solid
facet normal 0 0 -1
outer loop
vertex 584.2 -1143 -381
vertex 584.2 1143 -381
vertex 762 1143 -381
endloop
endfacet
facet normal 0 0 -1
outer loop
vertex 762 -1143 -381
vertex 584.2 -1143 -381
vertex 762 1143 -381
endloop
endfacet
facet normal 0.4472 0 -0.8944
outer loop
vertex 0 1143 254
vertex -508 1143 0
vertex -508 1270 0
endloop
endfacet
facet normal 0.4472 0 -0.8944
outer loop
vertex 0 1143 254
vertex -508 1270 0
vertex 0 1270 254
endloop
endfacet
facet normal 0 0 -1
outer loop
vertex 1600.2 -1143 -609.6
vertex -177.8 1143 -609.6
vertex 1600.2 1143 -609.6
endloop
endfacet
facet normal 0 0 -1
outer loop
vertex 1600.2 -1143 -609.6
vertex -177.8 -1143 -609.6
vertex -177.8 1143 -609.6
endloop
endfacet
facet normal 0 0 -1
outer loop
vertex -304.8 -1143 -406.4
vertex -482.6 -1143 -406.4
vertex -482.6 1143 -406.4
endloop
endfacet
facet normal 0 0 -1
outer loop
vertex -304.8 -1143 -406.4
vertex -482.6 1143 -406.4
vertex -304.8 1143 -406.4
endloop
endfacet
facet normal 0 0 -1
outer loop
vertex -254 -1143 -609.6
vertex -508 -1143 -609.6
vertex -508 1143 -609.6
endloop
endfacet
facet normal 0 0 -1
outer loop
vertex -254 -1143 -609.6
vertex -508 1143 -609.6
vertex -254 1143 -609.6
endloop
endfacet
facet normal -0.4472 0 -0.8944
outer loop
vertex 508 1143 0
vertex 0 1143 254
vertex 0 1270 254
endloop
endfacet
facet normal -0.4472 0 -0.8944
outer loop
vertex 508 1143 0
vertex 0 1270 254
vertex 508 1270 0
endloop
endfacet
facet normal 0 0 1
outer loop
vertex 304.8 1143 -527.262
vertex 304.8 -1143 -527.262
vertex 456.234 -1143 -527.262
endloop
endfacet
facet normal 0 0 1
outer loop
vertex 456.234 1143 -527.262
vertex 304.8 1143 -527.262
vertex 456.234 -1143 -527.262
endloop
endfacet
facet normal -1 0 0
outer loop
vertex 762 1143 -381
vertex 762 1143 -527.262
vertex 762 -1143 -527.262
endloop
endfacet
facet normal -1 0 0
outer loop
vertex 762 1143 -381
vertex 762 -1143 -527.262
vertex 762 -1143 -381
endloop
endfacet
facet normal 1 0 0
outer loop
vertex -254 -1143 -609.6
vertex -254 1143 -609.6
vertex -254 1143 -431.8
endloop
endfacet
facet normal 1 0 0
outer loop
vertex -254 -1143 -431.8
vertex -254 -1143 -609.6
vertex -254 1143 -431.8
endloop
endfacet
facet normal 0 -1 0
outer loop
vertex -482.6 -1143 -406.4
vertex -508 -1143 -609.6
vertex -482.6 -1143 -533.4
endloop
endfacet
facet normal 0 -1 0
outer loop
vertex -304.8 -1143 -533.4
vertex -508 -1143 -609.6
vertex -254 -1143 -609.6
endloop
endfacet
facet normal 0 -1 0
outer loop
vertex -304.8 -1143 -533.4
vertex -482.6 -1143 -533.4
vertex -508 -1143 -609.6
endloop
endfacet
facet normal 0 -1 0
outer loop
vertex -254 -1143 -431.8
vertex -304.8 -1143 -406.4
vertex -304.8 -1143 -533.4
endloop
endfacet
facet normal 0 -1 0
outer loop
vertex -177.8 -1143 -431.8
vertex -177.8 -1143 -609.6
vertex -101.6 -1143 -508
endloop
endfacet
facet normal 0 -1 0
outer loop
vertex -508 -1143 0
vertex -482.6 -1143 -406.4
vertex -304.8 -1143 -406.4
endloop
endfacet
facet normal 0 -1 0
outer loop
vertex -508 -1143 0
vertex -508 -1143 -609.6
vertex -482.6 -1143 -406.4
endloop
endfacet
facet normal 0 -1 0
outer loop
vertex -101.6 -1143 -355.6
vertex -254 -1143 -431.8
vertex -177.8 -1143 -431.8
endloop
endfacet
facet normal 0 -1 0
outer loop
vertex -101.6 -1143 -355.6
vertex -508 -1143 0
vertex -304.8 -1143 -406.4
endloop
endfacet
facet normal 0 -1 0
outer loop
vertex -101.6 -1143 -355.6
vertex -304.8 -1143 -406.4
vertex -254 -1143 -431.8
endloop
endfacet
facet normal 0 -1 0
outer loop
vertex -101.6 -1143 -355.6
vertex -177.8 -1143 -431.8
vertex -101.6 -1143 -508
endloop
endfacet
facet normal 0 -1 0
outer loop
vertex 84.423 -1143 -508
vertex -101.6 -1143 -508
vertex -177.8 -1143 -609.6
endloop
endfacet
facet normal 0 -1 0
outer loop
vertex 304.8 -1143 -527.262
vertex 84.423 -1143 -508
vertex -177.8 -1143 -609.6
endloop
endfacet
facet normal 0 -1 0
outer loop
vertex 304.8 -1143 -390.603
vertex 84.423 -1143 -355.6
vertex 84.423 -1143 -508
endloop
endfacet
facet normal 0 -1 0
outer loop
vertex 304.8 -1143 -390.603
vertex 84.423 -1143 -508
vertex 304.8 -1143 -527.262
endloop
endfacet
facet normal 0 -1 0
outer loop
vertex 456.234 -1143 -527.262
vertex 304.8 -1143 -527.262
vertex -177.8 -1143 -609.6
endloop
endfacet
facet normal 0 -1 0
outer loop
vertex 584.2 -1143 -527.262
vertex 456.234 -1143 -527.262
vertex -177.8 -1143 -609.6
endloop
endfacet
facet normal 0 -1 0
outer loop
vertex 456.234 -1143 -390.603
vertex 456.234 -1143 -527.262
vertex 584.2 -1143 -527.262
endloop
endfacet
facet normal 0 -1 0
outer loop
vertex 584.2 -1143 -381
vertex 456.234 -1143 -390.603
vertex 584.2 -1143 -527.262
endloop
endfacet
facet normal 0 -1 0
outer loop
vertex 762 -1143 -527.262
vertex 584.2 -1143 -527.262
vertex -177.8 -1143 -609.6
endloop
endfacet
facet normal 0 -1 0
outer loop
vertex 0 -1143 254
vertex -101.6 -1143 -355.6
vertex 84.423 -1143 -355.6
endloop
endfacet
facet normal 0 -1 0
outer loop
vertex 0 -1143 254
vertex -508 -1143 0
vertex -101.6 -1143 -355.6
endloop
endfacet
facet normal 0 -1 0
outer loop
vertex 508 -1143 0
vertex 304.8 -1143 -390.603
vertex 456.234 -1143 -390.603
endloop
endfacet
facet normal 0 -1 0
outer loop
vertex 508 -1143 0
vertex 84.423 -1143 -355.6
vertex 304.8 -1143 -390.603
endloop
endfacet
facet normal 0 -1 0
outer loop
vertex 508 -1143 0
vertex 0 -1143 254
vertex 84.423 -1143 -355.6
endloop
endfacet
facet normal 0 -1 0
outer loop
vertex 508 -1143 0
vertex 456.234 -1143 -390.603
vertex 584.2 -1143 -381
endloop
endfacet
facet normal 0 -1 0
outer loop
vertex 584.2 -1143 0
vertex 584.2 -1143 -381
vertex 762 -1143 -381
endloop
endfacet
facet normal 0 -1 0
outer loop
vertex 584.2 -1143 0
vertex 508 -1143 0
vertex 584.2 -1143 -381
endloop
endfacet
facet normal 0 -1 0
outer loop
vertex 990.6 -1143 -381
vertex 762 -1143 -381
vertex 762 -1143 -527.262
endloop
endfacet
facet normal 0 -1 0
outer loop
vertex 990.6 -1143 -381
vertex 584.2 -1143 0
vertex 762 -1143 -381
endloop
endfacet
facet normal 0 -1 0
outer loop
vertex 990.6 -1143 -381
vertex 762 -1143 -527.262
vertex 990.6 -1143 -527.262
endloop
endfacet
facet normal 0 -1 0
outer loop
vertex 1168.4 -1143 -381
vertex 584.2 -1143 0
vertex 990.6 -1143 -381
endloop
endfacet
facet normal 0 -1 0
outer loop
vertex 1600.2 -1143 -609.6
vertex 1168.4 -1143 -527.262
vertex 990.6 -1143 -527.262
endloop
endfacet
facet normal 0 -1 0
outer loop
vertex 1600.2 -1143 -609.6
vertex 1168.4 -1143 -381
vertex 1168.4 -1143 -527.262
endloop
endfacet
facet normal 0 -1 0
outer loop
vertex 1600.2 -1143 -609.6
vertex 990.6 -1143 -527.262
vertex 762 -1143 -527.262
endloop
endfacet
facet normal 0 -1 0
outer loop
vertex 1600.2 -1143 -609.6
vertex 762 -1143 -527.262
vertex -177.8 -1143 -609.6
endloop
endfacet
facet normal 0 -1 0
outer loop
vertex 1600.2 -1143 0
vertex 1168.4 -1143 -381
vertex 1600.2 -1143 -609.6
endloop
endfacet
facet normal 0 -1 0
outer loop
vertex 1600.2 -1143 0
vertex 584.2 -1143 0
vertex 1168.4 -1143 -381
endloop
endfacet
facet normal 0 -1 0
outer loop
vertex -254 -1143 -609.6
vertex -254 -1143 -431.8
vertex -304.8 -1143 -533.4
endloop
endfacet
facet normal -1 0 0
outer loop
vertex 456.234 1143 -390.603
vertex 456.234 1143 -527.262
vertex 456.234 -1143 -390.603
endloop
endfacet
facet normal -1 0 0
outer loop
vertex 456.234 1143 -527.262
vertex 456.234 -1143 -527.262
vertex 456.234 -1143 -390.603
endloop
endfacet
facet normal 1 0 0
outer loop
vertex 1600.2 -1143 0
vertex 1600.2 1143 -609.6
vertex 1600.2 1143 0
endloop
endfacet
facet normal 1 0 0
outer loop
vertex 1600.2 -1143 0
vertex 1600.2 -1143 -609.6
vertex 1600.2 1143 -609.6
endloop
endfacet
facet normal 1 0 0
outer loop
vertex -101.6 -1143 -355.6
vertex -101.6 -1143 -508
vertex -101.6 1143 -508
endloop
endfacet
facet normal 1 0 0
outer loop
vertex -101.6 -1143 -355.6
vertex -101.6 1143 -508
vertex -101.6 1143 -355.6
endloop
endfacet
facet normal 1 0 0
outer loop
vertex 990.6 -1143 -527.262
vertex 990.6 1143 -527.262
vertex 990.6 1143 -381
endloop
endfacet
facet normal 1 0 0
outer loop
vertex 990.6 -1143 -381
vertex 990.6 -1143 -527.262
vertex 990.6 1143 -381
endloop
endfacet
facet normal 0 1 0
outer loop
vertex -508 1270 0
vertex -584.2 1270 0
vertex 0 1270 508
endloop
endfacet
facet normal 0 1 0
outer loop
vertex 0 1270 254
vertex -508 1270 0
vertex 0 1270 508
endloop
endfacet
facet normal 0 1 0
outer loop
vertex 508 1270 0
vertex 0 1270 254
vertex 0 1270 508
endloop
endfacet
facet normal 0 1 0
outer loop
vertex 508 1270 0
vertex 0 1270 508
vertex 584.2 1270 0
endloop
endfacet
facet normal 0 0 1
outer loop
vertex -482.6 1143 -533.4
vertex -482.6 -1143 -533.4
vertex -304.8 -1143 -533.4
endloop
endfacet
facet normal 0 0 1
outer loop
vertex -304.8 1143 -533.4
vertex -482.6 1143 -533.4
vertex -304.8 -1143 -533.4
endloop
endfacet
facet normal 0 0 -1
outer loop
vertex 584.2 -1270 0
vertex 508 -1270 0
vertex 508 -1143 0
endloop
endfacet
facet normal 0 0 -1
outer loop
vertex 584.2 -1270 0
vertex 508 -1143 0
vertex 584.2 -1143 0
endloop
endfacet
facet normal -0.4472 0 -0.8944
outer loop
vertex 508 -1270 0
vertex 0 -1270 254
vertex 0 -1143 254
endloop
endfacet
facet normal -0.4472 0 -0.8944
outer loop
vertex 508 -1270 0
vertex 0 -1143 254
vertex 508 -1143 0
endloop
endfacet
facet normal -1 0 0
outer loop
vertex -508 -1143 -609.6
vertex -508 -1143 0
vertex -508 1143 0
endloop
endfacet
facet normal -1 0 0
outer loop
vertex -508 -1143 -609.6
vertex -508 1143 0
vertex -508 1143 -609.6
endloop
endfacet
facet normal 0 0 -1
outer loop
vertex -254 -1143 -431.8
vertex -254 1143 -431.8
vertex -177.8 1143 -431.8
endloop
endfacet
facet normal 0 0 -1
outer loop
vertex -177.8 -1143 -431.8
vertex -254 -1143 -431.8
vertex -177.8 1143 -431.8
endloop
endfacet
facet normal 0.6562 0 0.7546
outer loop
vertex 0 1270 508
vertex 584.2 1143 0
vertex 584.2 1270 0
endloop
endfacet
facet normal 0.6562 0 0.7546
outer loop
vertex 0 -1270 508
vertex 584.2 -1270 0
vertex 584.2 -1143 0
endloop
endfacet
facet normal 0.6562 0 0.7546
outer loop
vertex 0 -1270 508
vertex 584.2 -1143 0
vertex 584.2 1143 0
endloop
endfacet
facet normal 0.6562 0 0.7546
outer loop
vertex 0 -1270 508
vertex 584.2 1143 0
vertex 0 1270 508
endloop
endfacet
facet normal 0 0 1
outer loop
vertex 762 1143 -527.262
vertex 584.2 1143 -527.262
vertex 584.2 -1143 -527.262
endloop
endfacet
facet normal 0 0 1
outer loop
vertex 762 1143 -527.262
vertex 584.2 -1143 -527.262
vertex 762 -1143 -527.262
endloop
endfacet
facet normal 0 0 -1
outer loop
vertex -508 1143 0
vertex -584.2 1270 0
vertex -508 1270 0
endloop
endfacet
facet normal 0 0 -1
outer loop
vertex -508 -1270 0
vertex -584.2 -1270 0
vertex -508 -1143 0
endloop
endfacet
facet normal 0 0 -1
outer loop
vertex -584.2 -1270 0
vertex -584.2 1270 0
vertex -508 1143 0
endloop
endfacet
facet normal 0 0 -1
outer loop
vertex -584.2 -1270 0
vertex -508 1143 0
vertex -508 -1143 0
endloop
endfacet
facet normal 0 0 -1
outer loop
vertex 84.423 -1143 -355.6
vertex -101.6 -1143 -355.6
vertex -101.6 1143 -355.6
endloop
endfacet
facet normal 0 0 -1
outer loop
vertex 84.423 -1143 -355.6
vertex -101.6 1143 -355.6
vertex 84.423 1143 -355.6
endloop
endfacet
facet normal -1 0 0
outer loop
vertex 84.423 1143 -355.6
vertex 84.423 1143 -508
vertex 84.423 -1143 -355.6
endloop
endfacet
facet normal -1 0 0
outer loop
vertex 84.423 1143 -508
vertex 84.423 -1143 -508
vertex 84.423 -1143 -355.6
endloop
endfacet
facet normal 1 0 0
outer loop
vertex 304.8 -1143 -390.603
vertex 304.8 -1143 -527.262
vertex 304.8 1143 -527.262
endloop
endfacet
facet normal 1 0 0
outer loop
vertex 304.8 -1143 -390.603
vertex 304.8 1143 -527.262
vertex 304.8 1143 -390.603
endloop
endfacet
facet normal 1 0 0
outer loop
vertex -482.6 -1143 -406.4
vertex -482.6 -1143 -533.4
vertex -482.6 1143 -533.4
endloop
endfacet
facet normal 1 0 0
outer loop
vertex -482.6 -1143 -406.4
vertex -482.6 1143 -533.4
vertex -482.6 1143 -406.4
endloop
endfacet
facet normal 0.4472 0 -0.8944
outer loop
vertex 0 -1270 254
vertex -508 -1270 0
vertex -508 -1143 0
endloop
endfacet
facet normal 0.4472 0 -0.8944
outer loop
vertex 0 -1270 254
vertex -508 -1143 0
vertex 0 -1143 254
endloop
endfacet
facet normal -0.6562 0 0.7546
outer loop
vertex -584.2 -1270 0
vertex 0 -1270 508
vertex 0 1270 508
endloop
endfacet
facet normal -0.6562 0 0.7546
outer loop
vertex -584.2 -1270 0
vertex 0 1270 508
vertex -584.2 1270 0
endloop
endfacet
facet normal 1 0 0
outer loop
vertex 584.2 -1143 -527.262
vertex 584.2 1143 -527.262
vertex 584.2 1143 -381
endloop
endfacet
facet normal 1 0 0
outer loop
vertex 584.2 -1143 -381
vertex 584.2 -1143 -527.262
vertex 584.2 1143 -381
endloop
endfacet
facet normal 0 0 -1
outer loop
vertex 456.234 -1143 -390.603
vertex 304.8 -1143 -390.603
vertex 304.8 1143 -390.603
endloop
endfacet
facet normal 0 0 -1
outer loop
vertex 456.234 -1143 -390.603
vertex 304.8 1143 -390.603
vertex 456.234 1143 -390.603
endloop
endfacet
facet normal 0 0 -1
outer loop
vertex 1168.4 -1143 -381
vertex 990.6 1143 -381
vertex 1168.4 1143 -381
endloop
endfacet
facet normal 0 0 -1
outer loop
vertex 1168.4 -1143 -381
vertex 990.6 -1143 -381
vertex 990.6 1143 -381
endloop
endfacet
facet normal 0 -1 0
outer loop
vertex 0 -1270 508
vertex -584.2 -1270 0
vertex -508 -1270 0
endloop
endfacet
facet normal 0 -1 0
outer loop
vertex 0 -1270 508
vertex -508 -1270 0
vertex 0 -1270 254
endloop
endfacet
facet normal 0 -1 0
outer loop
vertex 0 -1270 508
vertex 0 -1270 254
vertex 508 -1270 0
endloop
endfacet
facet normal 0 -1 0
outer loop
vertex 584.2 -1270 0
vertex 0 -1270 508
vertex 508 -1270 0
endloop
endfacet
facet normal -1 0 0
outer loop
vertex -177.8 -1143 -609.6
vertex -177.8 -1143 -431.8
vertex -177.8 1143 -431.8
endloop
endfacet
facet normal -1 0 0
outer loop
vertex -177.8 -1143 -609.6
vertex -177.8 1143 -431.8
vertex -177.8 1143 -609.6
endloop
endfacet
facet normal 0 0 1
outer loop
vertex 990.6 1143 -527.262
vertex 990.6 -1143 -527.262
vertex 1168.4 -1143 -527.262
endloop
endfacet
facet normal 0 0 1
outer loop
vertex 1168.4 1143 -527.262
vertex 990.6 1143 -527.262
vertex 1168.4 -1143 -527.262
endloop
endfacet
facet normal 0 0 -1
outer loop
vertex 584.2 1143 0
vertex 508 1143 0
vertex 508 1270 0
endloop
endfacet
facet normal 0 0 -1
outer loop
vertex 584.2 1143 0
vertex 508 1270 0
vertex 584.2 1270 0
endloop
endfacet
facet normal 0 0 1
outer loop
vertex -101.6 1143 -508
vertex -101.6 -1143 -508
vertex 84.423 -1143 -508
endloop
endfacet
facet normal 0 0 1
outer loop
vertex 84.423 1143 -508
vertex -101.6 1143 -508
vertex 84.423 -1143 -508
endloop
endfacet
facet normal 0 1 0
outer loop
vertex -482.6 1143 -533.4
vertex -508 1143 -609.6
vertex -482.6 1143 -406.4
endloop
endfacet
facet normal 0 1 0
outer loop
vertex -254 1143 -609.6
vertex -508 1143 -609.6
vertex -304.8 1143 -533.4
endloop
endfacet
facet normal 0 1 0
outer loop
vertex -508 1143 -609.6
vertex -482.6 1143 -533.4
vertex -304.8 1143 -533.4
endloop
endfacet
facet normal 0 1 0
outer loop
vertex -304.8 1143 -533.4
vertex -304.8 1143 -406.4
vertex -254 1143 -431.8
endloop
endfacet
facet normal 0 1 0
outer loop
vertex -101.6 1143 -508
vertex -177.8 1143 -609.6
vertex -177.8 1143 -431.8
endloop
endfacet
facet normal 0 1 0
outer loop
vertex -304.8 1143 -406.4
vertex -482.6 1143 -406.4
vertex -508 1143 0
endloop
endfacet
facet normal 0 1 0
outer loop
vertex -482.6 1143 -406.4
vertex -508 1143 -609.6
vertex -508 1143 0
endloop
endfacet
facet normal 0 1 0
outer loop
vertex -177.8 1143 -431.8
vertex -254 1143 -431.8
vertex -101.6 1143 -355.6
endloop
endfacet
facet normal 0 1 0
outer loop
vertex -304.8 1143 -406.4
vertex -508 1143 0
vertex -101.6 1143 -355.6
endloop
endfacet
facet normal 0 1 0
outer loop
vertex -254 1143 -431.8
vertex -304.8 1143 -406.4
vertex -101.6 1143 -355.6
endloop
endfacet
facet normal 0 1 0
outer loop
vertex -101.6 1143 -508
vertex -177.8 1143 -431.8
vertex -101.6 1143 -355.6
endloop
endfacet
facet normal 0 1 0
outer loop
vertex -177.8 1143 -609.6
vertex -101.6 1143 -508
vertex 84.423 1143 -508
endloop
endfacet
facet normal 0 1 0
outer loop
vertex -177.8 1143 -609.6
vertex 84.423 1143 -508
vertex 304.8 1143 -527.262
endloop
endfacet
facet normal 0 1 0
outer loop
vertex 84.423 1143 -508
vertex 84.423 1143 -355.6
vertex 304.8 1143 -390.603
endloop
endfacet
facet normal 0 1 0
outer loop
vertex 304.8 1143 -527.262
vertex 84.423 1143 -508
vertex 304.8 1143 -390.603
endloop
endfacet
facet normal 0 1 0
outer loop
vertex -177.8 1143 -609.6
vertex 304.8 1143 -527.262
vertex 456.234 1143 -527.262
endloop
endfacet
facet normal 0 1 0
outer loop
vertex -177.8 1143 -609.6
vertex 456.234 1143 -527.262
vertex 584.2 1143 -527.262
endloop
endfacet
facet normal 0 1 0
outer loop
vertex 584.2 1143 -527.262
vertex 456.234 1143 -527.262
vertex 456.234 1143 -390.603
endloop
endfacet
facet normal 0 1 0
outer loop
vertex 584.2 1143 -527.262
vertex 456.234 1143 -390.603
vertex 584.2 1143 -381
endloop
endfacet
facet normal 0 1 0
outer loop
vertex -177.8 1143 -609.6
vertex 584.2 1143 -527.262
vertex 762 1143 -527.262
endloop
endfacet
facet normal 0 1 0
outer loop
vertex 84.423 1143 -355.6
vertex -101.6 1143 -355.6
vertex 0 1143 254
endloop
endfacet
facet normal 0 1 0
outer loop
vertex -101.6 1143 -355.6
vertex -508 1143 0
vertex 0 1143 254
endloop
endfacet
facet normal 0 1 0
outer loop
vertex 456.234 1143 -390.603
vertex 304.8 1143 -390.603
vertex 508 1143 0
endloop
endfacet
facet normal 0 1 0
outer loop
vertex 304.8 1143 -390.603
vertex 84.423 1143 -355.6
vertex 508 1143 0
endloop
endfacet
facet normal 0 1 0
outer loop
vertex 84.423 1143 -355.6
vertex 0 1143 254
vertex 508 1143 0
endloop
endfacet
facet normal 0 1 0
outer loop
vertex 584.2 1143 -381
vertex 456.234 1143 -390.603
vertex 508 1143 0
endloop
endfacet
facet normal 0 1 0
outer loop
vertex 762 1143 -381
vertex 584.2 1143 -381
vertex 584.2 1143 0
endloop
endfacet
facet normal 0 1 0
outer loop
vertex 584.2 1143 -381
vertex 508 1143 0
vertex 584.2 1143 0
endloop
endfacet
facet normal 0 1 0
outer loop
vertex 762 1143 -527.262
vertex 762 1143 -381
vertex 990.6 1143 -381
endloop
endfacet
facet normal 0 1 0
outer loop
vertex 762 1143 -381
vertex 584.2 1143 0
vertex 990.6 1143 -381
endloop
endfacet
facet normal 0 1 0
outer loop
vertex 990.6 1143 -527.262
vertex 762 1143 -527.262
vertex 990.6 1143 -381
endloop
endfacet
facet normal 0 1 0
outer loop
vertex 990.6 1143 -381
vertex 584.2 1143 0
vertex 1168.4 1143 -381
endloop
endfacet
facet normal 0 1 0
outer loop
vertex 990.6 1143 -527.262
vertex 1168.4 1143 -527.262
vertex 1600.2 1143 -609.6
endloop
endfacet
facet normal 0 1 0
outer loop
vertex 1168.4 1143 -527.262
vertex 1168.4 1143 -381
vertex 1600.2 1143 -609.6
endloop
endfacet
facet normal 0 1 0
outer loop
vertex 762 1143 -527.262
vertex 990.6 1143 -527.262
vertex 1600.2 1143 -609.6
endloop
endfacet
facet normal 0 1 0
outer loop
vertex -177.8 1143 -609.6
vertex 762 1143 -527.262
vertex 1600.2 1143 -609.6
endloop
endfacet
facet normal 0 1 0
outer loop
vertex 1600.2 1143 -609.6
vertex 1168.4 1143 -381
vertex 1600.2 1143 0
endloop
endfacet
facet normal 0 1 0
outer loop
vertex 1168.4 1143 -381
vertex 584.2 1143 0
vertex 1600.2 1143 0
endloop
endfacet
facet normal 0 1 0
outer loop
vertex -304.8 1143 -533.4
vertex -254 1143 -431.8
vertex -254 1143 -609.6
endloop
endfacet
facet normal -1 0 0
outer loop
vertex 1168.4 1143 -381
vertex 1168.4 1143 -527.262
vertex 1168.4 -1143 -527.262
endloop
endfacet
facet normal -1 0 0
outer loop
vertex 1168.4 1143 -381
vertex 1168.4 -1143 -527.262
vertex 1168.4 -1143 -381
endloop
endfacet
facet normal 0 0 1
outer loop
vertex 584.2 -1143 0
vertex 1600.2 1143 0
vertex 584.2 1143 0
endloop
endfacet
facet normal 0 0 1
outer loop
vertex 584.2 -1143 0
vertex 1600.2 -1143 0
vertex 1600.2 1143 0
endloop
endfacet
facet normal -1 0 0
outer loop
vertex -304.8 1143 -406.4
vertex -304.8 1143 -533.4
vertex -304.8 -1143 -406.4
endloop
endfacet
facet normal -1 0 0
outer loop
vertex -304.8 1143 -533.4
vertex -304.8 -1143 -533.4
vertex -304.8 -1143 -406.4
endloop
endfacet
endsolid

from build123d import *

# Parameters (mm, degrees)
F1_DEPTH = 1270
F0_W     = 177.8
F0_H     = 127
F0_W_2   = 186.0230279326
F0_H_2   = 152.4
F0_W_3   = 151.4337956905
F0_H_3   = 136.6598010063
F0_H_4   = 146.2624492645
F2_DEPTH = 1143


with BuildPart() as f1:
    # F0 (on Front) → F1 (new body, symmetric)
    with BuildSketch(Plane.XZ):
        Polygon((-584.2, 0), (-508, 0), (0, 254), (0, 508), align=None)
        Polygon((0, 254), (508, 0), (584.2, 0), (0, 508), align=None)
    extrude(amount=F1_DEPTH, both=True)

    # F0 (on Front) → F2 (join, symmetric)
    with BuildSketch(Plane.XZ):
        Polygon((-584.2, 0), (-508, 0), (0, 254), (0, 508), align=None)
        Polygon((0, 254), (508, 0), (584.2, 0), (0, 508), align=None)
        Polygon((0, 254), (0, 0), (508, 0), align=None)
        Polygon((-508, 0), (0, 0), (0, 254), align=None)
        Polygon((508, 0), (0, 0), (-508, 0), (-508, -609.6), (-254, -609.6), (-254, -431.8), (-177.8, -431.8), (-177.8, -609.6), (508, -609.6), align=None)
        with Locations((-393.7, -469.9)):
            Rectangle(F0_W, F0_H, mode=Mode.SUBTRACT)
        with Locations((-8.5884860337, -431.8)):
            Rectangle(F0_W_2, F0_H_2, mode=Mode.SUBTRACT)
        with Locations((380.5168978453, -458.9325487614)):
            Rectangle(F0_W_3, F0_H_3, mode=Mode.SUBTRACT)
        Polygon((584.2, 0), (508, 0), (508, -609.6), (1600.2, -609.6), (1600.2, 0), align=None)
        with Locations((673.1, -454.1312246323)):
            Rectangle(F0_W, F0_H_4, mode=Mode.SUBTRACT)
        with Locations((1079.5, -454.1312246323)):
            Rectangle(F0_W, F0_H_4, mode=Mode.SUBTRACT)
    extrude(amount=F2_DEPTH, both=True)


solid = f1.part
